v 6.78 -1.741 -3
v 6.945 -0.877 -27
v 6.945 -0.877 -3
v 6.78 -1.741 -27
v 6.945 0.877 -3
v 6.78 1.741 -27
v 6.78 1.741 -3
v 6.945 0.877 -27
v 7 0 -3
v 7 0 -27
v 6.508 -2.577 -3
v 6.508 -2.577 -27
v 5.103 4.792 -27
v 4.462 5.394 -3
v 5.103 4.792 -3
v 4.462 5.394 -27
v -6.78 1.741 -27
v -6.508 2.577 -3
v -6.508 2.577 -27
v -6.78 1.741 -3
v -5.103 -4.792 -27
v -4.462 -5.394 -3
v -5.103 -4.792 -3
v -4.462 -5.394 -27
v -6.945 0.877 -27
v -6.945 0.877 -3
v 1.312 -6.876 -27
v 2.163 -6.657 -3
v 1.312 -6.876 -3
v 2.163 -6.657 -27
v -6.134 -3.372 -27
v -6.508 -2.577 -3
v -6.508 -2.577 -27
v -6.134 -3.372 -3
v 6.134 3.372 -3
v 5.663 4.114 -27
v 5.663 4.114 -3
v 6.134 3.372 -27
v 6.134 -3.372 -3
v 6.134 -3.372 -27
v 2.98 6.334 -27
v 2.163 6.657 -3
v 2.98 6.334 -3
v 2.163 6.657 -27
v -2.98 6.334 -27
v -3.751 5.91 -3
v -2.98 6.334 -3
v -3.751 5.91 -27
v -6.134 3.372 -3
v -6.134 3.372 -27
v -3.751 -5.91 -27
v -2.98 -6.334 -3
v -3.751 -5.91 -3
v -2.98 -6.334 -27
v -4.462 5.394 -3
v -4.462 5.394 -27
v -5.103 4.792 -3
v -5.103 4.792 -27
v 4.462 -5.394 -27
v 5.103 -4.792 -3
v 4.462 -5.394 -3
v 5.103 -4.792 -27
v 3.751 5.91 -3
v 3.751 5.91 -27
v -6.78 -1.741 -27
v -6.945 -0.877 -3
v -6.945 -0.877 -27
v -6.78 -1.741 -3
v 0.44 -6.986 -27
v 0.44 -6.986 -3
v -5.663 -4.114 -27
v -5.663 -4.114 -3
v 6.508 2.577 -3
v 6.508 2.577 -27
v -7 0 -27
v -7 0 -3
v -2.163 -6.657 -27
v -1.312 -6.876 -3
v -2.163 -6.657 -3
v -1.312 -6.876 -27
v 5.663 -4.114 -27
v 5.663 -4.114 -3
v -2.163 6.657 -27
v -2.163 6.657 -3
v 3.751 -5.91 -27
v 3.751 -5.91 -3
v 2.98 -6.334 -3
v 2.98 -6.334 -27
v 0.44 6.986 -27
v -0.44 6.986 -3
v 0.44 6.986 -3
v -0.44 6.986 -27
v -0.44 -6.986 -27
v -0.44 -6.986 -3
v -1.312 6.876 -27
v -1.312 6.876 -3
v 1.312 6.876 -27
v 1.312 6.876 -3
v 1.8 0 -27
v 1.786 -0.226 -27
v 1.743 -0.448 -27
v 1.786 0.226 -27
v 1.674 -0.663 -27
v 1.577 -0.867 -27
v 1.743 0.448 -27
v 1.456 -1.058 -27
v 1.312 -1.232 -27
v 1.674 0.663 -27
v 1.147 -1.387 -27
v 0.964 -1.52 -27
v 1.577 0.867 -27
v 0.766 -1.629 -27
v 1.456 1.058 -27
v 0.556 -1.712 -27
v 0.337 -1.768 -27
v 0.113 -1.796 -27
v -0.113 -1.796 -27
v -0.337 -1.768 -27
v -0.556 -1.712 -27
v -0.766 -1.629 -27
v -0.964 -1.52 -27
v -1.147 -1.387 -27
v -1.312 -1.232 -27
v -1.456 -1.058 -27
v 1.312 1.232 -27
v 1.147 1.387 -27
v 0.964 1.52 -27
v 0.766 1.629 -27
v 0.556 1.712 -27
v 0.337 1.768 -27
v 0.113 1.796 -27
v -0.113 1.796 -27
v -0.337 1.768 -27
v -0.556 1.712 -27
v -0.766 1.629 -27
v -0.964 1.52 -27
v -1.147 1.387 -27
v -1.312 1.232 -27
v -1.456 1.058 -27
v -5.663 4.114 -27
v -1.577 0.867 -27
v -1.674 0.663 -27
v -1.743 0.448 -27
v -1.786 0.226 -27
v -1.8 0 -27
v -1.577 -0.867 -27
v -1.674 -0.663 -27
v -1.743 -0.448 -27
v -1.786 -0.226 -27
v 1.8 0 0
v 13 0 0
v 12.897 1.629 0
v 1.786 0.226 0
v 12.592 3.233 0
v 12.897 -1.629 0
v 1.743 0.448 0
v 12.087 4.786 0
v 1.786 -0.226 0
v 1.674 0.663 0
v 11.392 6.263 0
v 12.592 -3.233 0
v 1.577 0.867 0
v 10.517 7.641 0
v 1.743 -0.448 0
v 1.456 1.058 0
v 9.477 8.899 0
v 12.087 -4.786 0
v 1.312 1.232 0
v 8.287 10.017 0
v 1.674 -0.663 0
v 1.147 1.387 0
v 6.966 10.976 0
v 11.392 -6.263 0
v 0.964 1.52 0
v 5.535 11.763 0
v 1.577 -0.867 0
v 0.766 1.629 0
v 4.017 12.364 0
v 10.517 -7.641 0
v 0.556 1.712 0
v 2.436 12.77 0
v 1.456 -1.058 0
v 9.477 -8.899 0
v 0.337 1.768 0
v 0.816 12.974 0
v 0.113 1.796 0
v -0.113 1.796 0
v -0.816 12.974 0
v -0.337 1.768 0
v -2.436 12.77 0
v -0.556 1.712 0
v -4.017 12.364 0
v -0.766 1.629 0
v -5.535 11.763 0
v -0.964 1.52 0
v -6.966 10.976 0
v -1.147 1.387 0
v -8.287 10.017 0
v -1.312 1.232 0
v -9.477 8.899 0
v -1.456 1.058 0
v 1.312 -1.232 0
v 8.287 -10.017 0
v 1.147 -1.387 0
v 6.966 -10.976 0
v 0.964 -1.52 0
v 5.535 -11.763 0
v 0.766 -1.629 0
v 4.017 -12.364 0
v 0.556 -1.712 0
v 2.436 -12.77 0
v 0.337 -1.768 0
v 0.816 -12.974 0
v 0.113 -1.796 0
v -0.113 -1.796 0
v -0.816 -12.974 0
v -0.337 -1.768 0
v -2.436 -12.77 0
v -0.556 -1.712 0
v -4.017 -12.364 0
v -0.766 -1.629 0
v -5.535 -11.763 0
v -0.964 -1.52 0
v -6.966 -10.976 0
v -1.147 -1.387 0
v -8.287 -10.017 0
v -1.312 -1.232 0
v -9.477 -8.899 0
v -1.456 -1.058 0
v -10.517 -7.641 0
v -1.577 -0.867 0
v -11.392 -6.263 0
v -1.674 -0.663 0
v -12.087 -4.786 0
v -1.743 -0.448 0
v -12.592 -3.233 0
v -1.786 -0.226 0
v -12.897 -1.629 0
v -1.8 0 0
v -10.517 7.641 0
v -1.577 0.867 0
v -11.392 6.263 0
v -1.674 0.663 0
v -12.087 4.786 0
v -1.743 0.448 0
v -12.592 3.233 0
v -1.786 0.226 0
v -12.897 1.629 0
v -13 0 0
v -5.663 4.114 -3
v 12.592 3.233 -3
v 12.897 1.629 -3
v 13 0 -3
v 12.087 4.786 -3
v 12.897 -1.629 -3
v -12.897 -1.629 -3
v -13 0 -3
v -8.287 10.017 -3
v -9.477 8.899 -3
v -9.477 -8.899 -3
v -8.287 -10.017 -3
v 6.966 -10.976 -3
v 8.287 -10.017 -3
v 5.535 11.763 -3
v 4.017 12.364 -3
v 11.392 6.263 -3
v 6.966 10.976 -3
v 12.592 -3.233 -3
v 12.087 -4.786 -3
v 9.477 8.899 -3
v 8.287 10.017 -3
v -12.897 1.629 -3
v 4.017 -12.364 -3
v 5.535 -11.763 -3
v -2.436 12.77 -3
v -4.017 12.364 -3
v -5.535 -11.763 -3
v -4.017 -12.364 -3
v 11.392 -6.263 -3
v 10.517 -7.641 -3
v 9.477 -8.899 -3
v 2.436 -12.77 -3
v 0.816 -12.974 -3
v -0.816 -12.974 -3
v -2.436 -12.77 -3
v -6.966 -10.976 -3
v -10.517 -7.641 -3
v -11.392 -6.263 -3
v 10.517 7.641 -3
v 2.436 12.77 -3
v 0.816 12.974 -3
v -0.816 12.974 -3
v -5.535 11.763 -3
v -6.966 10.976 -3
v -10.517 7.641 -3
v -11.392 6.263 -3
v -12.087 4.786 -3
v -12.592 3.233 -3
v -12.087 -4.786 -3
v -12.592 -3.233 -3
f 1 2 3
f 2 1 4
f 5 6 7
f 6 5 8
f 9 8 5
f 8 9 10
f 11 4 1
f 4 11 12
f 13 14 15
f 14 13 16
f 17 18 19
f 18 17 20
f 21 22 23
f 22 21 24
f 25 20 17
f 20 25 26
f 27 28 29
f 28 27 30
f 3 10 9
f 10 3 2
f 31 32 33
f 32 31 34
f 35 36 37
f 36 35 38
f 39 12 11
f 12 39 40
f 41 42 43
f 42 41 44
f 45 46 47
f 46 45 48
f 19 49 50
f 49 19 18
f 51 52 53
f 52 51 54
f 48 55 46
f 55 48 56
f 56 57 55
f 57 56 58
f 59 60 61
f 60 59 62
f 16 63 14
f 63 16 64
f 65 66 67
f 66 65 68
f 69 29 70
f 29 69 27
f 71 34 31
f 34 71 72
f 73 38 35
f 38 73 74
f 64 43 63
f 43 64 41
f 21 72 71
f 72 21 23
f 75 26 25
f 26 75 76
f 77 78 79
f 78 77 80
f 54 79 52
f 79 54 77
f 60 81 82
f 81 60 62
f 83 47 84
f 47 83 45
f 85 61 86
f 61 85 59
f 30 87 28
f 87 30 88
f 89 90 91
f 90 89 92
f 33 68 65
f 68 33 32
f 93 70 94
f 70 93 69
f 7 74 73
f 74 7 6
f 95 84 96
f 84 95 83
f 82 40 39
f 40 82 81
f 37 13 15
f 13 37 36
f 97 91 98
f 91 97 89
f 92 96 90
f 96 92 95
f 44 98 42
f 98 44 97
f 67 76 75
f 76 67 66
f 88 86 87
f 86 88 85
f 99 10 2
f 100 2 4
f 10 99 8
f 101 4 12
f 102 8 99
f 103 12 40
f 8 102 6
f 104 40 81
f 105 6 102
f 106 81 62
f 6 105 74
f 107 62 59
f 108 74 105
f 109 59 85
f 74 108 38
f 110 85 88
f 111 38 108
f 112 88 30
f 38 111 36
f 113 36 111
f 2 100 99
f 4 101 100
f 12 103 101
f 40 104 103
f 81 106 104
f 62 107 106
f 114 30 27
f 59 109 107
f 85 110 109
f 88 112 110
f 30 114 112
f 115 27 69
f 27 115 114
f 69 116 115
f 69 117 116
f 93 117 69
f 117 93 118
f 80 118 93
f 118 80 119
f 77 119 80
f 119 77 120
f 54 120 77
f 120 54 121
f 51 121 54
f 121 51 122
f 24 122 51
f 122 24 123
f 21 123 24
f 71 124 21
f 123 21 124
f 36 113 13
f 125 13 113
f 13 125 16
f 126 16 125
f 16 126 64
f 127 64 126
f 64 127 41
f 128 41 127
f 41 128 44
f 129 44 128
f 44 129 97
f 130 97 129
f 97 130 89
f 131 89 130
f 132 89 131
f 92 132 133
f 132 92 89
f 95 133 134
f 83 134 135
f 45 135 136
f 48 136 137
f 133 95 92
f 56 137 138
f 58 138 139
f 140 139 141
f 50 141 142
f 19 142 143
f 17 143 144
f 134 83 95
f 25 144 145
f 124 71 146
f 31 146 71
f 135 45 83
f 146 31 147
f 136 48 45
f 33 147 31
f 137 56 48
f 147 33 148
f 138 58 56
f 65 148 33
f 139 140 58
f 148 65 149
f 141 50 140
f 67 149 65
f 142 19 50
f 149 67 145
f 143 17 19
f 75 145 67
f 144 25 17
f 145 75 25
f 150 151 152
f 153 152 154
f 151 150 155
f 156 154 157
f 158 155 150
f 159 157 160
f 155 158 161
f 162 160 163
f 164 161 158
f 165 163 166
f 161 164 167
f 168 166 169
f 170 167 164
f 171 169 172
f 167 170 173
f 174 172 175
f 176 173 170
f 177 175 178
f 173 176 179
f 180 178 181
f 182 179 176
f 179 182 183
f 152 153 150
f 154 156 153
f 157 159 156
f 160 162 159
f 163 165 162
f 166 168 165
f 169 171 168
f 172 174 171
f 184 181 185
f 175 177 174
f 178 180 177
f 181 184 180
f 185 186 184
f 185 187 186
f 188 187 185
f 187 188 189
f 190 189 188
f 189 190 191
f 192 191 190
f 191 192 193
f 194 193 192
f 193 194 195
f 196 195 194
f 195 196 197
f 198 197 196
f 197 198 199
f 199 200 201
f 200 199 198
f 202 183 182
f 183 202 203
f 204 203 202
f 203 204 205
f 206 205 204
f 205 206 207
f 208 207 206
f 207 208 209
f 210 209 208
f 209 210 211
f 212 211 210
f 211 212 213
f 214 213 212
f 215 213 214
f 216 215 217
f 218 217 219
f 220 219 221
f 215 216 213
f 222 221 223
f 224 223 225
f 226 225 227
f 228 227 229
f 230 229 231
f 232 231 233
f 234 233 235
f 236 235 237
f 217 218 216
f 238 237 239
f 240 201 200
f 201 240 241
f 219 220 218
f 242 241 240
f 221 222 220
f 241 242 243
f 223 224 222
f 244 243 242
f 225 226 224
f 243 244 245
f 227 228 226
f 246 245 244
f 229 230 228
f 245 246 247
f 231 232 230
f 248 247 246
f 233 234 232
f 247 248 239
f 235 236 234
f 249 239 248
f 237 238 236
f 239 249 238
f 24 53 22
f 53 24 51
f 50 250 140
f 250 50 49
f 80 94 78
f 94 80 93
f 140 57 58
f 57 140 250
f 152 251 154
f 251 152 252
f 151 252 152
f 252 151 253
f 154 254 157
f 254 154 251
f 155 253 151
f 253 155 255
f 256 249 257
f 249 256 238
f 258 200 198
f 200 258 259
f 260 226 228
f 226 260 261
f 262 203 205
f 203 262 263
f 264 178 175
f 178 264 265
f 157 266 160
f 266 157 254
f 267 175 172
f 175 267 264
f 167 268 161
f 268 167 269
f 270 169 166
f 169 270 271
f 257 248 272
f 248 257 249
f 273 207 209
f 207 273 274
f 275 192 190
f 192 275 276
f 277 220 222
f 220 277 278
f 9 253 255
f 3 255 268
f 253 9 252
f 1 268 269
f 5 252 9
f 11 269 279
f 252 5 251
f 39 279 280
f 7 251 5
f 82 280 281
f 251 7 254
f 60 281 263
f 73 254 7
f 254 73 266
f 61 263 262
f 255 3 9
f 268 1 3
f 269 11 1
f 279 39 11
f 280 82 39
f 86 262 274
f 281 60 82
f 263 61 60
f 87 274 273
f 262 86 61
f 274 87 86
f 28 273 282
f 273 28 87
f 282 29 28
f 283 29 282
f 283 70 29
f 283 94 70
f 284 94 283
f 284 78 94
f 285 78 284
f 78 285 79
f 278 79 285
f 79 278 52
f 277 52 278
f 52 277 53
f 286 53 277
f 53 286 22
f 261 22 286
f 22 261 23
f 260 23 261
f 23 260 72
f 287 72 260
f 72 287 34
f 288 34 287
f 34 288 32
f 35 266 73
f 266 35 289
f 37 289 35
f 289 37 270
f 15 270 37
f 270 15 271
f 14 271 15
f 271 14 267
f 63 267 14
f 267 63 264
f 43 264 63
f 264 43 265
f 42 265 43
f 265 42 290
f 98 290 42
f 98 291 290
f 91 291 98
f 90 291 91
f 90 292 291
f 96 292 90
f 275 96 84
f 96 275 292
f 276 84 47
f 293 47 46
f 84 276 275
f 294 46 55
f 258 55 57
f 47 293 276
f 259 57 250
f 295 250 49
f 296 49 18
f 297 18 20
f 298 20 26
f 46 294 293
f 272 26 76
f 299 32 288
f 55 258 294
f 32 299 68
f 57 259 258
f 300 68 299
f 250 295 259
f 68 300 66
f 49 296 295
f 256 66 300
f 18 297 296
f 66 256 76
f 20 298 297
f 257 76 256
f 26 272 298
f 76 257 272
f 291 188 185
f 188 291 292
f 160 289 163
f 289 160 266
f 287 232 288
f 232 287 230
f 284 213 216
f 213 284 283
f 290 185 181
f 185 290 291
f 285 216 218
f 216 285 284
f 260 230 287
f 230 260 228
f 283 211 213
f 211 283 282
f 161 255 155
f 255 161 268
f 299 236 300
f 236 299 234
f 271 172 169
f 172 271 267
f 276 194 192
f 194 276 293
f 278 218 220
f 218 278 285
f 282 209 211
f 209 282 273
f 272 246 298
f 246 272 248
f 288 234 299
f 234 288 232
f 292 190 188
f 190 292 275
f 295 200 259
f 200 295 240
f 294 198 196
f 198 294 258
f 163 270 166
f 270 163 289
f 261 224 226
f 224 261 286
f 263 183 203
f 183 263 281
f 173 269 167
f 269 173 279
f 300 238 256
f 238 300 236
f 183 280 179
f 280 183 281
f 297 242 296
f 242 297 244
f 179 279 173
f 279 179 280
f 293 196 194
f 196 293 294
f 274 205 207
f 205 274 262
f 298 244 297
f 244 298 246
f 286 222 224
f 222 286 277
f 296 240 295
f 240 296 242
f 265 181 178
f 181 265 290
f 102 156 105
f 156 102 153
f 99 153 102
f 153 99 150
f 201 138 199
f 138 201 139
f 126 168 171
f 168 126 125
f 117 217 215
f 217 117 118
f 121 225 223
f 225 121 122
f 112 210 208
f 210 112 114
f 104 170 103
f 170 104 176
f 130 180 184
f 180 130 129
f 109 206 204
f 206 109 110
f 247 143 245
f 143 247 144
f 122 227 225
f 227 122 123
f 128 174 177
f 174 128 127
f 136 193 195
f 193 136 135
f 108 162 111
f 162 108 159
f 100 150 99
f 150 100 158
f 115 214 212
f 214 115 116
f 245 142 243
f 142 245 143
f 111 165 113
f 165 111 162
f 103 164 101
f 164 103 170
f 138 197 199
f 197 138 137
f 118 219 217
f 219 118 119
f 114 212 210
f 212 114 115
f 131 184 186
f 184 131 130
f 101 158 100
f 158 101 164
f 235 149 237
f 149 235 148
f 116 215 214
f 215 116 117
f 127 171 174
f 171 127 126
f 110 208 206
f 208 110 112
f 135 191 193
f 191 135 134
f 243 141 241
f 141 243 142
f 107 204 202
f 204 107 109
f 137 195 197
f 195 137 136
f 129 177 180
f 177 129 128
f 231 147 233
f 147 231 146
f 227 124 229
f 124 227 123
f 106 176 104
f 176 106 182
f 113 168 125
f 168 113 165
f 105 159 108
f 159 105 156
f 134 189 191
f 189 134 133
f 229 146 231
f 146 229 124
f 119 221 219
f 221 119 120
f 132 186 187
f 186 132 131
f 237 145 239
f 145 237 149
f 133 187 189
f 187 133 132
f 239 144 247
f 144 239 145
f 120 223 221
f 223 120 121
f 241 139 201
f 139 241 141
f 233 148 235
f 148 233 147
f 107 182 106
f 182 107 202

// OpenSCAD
$fn = 50;


difference() {
	union() {
		translate(v = [0, 0, -27.0000000000]) {
			cylinder(h = 27, r = 7.0000000000);
		}
		translate(v = [0, 0, -3.0000000000]) {
			cylinder(h = 3, r = 13.0000000000);
		}
	}
	union() {
		#translate(v = [0, 0, -27]) {
			cylinder(h = 27, r = 1.8000000000);
		}
	}
}
